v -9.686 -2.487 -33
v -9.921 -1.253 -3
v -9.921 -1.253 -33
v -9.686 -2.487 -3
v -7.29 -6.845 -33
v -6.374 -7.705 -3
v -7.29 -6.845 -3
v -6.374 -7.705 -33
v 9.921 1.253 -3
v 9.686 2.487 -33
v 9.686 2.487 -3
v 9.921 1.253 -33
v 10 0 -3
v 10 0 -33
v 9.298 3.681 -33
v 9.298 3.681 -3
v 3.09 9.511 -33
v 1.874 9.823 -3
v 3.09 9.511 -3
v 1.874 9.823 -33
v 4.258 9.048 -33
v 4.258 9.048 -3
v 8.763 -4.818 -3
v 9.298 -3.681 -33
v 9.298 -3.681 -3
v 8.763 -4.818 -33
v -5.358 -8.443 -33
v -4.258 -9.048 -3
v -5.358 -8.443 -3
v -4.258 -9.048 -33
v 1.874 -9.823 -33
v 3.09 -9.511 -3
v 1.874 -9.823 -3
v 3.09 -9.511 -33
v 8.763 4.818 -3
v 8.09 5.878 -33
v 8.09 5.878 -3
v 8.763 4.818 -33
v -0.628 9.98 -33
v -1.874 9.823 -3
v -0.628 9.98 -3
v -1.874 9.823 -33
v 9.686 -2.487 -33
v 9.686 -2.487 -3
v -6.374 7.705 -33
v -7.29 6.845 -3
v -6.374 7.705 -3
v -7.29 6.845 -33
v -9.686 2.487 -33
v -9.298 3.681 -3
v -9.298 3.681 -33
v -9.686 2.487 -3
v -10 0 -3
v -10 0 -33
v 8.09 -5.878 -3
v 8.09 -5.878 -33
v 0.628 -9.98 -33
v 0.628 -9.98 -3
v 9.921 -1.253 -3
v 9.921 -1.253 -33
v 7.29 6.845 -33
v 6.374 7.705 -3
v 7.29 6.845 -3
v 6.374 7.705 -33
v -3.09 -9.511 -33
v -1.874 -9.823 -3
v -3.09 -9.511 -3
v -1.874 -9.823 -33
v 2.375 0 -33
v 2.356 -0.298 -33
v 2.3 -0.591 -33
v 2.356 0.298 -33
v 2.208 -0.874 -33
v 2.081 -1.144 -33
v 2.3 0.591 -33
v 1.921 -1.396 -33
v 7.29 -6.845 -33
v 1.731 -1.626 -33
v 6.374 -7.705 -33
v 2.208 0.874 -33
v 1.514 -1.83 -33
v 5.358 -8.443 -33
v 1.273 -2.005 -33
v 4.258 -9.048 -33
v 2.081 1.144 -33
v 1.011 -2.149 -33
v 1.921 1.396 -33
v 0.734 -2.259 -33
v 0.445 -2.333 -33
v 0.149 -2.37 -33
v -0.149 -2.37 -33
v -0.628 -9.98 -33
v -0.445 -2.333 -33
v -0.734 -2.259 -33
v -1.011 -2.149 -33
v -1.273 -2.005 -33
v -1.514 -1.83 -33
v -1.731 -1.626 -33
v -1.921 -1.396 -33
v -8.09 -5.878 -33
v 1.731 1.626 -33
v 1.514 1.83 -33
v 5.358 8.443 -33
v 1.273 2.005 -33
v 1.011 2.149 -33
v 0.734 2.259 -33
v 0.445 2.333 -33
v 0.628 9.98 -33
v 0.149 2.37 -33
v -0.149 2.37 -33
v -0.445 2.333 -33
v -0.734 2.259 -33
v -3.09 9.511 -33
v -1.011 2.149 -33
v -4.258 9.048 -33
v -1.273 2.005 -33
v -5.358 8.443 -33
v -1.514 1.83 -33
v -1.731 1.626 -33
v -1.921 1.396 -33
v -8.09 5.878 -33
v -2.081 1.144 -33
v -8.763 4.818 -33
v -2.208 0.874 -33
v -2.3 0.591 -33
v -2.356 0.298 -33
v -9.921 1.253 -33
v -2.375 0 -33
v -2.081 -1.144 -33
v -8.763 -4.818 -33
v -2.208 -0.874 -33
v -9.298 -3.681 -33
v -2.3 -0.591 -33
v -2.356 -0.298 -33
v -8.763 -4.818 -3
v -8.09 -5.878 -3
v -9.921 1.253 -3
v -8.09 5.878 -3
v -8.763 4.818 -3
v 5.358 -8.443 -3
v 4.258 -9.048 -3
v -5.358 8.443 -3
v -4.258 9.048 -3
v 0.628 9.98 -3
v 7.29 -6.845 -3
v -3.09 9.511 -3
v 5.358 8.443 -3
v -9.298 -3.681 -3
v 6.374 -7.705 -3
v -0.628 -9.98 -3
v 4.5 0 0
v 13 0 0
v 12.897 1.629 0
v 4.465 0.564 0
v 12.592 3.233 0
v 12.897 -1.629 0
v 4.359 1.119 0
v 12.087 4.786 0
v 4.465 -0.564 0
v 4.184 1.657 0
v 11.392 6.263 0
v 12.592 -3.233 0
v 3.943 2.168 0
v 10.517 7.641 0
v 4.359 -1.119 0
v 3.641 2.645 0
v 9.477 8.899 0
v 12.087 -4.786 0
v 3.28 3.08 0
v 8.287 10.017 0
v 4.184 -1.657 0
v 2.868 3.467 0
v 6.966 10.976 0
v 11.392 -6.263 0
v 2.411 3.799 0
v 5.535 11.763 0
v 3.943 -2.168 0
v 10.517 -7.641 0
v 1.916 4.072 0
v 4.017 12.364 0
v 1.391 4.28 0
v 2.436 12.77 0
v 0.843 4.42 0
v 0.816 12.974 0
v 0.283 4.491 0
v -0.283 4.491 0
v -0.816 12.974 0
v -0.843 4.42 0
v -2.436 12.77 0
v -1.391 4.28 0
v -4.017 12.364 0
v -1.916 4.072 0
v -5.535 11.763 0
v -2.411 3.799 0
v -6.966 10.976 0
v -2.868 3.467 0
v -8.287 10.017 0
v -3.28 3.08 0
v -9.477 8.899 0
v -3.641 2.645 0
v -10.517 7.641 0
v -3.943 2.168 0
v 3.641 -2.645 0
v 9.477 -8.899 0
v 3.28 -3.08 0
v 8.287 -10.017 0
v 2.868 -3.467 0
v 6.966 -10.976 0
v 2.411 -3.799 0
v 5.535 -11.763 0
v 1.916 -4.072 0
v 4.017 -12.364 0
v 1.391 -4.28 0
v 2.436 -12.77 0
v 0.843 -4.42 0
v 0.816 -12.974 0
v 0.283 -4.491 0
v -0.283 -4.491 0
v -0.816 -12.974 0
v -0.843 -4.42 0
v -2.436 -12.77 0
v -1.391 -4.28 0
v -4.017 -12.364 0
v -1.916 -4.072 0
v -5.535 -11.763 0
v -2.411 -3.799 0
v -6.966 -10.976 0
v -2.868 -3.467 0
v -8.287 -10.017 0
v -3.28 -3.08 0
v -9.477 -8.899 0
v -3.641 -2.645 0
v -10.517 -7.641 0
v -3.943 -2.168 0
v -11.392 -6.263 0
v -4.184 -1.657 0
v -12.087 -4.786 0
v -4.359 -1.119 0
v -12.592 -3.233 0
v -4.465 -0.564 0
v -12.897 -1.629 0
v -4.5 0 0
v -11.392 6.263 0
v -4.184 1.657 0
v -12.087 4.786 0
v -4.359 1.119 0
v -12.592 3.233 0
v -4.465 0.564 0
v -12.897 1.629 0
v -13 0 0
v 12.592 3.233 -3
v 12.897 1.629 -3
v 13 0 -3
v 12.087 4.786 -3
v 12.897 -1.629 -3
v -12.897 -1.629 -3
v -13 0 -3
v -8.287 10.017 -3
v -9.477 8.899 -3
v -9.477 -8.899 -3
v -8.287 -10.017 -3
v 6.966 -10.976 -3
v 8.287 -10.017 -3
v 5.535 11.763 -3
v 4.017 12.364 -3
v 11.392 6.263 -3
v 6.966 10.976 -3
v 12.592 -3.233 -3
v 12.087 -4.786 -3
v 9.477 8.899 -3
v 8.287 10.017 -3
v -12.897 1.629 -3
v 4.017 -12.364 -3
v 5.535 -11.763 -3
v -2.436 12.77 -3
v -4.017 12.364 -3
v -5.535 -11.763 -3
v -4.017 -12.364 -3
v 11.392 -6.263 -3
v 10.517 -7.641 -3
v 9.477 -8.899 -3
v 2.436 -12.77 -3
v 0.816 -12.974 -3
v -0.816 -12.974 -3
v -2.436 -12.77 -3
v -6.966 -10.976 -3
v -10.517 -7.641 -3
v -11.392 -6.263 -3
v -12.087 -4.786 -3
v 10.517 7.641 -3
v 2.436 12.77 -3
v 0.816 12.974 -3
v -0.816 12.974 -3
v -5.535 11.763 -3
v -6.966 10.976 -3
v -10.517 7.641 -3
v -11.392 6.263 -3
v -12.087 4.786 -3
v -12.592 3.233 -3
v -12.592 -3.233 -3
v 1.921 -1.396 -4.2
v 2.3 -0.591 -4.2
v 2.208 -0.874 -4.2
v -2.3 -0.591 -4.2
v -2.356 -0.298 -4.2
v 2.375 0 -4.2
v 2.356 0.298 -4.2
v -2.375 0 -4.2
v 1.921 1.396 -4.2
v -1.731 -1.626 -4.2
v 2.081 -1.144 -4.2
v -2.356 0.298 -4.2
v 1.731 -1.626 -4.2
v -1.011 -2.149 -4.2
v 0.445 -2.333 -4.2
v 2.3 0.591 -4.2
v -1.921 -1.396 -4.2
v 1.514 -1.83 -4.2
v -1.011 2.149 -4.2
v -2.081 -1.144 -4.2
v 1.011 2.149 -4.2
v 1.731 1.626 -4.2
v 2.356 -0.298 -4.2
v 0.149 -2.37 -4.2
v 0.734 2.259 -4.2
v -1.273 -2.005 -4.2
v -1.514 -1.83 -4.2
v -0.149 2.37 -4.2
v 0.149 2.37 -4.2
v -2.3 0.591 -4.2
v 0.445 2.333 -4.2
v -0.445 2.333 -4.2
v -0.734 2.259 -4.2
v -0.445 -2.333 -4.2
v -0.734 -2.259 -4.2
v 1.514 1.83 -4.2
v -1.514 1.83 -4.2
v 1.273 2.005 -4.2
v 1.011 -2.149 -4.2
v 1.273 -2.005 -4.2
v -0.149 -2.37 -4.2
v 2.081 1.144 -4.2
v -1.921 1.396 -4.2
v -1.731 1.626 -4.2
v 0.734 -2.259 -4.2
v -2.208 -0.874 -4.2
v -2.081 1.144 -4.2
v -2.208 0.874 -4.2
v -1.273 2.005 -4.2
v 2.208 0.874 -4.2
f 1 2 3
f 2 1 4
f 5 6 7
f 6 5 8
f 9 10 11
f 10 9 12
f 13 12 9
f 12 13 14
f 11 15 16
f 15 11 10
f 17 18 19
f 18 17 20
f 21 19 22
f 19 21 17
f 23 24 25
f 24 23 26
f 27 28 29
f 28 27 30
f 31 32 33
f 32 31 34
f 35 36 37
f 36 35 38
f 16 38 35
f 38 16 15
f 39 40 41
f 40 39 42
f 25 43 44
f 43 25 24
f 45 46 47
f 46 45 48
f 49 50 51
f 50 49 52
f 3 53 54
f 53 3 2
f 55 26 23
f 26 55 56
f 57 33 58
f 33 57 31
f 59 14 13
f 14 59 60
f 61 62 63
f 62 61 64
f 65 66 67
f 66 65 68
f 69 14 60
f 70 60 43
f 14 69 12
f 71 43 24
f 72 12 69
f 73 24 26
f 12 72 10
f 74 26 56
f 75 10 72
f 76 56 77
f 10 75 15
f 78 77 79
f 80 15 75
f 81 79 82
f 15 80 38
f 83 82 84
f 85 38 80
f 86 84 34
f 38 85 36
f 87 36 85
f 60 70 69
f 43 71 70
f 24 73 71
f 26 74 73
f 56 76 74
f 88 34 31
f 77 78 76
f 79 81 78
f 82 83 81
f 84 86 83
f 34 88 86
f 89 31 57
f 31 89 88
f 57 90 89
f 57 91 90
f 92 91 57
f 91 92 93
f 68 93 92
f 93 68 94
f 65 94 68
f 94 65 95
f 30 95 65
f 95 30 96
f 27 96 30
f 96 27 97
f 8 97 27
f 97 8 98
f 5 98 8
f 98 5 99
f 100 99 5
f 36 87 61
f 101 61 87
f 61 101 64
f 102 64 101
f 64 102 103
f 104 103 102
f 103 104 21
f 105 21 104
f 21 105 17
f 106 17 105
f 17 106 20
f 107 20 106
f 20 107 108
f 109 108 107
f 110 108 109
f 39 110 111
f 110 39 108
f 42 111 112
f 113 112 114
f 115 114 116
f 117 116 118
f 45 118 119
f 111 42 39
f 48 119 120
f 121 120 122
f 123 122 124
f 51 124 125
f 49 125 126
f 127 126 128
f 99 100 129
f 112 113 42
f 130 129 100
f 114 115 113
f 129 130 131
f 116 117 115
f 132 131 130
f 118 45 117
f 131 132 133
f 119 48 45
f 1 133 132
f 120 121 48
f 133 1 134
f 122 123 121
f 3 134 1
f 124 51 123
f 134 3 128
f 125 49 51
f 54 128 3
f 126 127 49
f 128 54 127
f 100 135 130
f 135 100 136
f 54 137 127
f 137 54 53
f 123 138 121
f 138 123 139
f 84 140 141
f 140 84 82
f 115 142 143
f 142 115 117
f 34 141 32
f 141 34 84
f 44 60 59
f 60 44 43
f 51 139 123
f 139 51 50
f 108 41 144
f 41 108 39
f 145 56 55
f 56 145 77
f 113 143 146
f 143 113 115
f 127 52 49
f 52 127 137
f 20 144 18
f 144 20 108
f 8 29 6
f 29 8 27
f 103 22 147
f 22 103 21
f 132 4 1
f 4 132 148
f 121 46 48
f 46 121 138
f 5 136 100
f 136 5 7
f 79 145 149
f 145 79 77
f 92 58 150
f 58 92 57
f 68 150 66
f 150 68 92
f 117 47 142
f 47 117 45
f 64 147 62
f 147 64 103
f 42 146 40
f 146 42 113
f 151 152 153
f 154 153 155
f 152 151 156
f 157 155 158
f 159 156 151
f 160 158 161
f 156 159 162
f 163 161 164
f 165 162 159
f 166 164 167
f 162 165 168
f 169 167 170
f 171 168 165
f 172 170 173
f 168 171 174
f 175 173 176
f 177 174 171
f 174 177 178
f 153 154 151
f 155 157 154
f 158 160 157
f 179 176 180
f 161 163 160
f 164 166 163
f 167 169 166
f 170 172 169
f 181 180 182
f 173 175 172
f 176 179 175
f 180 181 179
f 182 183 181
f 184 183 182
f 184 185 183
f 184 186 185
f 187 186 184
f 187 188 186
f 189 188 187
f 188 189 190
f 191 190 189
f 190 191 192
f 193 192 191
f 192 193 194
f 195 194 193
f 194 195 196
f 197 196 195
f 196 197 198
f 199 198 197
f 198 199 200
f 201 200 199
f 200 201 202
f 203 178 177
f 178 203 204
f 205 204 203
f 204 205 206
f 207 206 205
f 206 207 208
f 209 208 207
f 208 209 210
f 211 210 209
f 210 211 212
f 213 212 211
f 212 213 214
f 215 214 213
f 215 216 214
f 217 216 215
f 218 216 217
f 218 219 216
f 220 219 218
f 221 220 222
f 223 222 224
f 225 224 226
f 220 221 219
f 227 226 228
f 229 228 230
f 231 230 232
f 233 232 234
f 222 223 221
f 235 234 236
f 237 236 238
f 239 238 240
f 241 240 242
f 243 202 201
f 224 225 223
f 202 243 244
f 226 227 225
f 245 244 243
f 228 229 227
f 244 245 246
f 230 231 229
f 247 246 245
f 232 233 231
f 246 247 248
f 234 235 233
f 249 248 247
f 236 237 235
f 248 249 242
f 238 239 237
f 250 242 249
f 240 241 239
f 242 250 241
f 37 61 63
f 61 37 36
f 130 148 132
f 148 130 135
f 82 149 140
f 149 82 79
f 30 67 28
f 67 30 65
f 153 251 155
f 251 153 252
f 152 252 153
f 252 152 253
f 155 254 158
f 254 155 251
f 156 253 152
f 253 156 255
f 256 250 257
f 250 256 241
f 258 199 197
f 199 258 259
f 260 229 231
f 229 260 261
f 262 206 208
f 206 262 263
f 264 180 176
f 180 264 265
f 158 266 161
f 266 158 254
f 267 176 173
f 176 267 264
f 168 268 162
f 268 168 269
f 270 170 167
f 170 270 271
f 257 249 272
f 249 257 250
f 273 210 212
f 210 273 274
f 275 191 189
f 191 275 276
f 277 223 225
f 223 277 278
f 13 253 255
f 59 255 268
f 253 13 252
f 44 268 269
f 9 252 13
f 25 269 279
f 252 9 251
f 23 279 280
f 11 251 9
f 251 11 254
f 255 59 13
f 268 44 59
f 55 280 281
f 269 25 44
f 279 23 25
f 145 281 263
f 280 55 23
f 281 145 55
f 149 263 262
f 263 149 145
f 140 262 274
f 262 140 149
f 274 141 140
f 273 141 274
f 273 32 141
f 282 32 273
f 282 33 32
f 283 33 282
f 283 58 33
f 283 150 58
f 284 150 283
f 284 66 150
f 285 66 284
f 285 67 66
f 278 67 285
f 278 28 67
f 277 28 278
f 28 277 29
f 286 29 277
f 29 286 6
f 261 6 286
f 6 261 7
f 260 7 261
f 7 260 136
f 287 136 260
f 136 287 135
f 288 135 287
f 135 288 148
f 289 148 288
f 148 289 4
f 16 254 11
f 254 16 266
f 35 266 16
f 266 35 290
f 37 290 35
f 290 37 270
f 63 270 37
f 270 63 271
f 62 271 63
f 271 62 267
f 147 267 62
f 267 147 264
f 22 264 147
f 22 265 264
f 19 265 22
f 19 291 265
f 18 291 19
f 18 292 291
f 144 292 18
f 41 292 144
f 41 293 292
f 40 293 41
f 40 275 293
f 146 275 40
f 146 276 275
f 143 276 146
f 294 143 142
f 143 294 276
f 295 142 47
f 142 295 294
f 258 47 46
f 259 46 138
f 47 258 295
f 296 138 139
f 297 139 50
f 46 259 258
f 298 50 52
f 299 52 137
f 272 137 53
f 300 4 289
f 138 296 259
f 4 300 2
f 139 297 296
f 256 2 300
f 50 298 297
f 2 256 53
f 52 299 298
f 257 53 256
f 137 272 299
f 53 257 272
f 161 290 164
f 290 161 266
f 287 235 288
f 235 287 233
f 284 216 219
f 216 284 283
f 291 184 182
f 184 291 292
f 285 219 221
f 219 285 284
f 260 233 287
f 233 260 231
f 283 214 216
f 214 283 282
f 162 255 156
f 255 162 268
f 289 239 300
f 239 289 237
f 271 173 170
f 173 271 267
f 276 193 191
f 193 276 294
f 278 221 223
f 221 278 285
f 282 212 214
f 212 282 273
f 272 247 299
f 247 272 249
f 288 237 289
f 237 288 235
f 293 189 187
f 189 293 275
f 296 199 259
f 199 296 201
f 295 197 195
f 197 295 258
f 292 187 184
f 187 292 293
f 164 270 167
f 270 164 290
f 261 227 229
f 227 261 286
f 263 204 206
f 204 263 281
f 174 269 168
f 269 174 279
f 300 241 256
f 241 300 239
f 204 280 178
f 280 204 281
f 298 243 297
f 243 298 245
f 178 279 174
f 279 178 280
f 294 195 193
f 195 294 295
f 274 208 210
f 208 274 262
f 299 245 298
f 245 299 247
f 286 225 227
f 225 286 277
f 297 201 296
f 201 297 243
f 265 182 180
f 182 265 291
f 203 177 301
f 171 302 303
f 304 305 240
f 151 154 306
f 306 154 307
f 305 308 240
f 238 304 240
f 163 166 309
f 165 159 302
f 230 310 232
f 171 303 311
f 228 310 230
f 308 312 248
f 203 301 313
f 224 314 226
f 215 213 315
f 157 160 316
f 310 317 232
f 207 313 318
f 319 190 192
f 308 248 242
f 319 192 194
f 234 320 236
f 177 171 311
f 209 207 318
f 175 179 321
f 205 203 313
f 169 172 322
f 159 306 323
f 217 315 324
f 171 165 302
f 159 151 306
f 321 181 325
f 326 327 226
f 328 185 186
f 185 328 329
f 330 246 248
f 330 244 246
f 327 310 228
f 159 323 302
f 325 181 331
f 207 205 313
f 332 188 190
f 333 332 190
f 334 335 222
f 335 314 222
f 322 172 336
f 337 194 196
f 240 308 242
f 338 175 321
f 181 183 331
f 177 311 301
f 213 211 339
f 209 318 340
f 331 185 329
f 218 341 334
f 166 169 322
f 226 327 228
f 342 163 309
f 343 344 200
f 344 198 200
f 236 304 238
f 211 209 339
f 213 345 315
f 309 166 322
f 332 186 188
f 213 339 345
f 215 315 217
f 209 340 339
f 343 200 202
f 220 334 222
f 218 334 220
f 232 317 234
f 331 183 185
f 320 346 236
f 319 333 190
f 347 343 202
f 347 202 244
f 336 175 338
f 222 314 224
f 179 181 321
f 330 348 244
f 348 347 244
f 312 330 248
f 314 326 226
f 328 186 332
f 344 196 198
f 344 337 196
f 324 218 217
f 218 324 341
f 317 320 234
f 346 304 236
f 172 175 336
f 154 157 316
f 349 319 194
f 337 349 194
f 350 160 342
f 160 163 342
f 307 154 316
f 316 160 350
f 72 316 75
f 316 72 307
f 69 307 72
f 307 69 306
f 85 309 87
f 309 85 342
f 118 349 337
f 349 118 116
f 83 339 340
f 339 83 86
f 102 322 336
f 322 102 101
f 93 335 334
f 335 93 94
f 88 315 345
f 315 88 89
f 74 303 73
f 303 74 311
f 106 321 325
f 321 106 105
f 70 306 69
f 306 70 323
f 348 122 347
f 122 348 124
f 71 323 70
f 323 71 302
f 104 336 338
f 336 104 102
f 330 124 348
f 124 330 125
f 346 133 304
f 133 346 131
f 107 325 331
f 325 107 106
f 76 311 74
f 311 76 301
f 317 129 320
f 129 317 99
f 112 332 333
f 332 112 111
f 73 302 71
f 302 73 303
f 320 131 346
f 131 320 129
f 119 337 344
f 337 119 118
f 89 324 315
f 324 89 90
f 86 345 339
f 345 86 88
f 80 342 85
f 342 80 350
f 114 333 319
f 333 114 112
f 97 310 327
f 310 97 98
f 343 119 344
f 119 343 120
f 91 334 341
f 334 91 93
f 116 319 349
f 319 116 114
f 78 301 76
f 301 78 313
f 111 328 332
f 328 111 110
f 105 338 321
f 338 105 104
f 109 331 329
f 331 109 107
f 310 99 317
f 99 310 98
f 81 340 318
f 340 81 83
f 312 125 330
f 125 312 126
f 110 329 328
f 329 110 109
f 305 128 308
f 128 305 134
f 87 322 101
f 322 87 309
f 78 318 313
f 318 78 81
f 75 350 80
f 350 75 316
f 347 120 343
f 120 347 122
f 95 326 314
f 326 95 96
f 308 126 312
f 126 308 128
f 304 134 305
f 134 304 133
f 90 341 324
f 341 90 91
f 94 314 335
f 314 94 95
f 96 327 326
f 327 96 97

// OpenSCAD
$fn = 50;


difference() {
	union() {
		translate(v = [0, 0, -33.0000000000]) {
			cylinder(h = 33, r = 10.0000000000);
		}
		translate(v = [0, 0, -3.0000000000]) {
			cylinder(h = 3, r = 13.0000000000);
		}
	}
	union() {
		translate(v = [0, 0, 0]) {
			rotate(a = [0, 0, 0]) {
				difference() {
					union() {
						#translate(v = [0, 0, -33.0000000000]) {
							cylinder(h = 33, r = 2.2500000000);
						}
						#translate(v = [0, 0, -4.2000000000]) {
							cylinder(h = 4.2000000000, r = 10.0000000000, r1 = 2.3750000000, r2 = 4.5000000000);
						}
						#translate(v = [0, 0, -33.0000000000]) {
							cylinder(h = 33, r = 2.3750000000);
						}
						#translate(v = [0, 0, -33.0000000000]) {
							cylinder(h = 33, r = 2.2500000000);
						}
					}
					union();
				}
			}
		}
	}
}
